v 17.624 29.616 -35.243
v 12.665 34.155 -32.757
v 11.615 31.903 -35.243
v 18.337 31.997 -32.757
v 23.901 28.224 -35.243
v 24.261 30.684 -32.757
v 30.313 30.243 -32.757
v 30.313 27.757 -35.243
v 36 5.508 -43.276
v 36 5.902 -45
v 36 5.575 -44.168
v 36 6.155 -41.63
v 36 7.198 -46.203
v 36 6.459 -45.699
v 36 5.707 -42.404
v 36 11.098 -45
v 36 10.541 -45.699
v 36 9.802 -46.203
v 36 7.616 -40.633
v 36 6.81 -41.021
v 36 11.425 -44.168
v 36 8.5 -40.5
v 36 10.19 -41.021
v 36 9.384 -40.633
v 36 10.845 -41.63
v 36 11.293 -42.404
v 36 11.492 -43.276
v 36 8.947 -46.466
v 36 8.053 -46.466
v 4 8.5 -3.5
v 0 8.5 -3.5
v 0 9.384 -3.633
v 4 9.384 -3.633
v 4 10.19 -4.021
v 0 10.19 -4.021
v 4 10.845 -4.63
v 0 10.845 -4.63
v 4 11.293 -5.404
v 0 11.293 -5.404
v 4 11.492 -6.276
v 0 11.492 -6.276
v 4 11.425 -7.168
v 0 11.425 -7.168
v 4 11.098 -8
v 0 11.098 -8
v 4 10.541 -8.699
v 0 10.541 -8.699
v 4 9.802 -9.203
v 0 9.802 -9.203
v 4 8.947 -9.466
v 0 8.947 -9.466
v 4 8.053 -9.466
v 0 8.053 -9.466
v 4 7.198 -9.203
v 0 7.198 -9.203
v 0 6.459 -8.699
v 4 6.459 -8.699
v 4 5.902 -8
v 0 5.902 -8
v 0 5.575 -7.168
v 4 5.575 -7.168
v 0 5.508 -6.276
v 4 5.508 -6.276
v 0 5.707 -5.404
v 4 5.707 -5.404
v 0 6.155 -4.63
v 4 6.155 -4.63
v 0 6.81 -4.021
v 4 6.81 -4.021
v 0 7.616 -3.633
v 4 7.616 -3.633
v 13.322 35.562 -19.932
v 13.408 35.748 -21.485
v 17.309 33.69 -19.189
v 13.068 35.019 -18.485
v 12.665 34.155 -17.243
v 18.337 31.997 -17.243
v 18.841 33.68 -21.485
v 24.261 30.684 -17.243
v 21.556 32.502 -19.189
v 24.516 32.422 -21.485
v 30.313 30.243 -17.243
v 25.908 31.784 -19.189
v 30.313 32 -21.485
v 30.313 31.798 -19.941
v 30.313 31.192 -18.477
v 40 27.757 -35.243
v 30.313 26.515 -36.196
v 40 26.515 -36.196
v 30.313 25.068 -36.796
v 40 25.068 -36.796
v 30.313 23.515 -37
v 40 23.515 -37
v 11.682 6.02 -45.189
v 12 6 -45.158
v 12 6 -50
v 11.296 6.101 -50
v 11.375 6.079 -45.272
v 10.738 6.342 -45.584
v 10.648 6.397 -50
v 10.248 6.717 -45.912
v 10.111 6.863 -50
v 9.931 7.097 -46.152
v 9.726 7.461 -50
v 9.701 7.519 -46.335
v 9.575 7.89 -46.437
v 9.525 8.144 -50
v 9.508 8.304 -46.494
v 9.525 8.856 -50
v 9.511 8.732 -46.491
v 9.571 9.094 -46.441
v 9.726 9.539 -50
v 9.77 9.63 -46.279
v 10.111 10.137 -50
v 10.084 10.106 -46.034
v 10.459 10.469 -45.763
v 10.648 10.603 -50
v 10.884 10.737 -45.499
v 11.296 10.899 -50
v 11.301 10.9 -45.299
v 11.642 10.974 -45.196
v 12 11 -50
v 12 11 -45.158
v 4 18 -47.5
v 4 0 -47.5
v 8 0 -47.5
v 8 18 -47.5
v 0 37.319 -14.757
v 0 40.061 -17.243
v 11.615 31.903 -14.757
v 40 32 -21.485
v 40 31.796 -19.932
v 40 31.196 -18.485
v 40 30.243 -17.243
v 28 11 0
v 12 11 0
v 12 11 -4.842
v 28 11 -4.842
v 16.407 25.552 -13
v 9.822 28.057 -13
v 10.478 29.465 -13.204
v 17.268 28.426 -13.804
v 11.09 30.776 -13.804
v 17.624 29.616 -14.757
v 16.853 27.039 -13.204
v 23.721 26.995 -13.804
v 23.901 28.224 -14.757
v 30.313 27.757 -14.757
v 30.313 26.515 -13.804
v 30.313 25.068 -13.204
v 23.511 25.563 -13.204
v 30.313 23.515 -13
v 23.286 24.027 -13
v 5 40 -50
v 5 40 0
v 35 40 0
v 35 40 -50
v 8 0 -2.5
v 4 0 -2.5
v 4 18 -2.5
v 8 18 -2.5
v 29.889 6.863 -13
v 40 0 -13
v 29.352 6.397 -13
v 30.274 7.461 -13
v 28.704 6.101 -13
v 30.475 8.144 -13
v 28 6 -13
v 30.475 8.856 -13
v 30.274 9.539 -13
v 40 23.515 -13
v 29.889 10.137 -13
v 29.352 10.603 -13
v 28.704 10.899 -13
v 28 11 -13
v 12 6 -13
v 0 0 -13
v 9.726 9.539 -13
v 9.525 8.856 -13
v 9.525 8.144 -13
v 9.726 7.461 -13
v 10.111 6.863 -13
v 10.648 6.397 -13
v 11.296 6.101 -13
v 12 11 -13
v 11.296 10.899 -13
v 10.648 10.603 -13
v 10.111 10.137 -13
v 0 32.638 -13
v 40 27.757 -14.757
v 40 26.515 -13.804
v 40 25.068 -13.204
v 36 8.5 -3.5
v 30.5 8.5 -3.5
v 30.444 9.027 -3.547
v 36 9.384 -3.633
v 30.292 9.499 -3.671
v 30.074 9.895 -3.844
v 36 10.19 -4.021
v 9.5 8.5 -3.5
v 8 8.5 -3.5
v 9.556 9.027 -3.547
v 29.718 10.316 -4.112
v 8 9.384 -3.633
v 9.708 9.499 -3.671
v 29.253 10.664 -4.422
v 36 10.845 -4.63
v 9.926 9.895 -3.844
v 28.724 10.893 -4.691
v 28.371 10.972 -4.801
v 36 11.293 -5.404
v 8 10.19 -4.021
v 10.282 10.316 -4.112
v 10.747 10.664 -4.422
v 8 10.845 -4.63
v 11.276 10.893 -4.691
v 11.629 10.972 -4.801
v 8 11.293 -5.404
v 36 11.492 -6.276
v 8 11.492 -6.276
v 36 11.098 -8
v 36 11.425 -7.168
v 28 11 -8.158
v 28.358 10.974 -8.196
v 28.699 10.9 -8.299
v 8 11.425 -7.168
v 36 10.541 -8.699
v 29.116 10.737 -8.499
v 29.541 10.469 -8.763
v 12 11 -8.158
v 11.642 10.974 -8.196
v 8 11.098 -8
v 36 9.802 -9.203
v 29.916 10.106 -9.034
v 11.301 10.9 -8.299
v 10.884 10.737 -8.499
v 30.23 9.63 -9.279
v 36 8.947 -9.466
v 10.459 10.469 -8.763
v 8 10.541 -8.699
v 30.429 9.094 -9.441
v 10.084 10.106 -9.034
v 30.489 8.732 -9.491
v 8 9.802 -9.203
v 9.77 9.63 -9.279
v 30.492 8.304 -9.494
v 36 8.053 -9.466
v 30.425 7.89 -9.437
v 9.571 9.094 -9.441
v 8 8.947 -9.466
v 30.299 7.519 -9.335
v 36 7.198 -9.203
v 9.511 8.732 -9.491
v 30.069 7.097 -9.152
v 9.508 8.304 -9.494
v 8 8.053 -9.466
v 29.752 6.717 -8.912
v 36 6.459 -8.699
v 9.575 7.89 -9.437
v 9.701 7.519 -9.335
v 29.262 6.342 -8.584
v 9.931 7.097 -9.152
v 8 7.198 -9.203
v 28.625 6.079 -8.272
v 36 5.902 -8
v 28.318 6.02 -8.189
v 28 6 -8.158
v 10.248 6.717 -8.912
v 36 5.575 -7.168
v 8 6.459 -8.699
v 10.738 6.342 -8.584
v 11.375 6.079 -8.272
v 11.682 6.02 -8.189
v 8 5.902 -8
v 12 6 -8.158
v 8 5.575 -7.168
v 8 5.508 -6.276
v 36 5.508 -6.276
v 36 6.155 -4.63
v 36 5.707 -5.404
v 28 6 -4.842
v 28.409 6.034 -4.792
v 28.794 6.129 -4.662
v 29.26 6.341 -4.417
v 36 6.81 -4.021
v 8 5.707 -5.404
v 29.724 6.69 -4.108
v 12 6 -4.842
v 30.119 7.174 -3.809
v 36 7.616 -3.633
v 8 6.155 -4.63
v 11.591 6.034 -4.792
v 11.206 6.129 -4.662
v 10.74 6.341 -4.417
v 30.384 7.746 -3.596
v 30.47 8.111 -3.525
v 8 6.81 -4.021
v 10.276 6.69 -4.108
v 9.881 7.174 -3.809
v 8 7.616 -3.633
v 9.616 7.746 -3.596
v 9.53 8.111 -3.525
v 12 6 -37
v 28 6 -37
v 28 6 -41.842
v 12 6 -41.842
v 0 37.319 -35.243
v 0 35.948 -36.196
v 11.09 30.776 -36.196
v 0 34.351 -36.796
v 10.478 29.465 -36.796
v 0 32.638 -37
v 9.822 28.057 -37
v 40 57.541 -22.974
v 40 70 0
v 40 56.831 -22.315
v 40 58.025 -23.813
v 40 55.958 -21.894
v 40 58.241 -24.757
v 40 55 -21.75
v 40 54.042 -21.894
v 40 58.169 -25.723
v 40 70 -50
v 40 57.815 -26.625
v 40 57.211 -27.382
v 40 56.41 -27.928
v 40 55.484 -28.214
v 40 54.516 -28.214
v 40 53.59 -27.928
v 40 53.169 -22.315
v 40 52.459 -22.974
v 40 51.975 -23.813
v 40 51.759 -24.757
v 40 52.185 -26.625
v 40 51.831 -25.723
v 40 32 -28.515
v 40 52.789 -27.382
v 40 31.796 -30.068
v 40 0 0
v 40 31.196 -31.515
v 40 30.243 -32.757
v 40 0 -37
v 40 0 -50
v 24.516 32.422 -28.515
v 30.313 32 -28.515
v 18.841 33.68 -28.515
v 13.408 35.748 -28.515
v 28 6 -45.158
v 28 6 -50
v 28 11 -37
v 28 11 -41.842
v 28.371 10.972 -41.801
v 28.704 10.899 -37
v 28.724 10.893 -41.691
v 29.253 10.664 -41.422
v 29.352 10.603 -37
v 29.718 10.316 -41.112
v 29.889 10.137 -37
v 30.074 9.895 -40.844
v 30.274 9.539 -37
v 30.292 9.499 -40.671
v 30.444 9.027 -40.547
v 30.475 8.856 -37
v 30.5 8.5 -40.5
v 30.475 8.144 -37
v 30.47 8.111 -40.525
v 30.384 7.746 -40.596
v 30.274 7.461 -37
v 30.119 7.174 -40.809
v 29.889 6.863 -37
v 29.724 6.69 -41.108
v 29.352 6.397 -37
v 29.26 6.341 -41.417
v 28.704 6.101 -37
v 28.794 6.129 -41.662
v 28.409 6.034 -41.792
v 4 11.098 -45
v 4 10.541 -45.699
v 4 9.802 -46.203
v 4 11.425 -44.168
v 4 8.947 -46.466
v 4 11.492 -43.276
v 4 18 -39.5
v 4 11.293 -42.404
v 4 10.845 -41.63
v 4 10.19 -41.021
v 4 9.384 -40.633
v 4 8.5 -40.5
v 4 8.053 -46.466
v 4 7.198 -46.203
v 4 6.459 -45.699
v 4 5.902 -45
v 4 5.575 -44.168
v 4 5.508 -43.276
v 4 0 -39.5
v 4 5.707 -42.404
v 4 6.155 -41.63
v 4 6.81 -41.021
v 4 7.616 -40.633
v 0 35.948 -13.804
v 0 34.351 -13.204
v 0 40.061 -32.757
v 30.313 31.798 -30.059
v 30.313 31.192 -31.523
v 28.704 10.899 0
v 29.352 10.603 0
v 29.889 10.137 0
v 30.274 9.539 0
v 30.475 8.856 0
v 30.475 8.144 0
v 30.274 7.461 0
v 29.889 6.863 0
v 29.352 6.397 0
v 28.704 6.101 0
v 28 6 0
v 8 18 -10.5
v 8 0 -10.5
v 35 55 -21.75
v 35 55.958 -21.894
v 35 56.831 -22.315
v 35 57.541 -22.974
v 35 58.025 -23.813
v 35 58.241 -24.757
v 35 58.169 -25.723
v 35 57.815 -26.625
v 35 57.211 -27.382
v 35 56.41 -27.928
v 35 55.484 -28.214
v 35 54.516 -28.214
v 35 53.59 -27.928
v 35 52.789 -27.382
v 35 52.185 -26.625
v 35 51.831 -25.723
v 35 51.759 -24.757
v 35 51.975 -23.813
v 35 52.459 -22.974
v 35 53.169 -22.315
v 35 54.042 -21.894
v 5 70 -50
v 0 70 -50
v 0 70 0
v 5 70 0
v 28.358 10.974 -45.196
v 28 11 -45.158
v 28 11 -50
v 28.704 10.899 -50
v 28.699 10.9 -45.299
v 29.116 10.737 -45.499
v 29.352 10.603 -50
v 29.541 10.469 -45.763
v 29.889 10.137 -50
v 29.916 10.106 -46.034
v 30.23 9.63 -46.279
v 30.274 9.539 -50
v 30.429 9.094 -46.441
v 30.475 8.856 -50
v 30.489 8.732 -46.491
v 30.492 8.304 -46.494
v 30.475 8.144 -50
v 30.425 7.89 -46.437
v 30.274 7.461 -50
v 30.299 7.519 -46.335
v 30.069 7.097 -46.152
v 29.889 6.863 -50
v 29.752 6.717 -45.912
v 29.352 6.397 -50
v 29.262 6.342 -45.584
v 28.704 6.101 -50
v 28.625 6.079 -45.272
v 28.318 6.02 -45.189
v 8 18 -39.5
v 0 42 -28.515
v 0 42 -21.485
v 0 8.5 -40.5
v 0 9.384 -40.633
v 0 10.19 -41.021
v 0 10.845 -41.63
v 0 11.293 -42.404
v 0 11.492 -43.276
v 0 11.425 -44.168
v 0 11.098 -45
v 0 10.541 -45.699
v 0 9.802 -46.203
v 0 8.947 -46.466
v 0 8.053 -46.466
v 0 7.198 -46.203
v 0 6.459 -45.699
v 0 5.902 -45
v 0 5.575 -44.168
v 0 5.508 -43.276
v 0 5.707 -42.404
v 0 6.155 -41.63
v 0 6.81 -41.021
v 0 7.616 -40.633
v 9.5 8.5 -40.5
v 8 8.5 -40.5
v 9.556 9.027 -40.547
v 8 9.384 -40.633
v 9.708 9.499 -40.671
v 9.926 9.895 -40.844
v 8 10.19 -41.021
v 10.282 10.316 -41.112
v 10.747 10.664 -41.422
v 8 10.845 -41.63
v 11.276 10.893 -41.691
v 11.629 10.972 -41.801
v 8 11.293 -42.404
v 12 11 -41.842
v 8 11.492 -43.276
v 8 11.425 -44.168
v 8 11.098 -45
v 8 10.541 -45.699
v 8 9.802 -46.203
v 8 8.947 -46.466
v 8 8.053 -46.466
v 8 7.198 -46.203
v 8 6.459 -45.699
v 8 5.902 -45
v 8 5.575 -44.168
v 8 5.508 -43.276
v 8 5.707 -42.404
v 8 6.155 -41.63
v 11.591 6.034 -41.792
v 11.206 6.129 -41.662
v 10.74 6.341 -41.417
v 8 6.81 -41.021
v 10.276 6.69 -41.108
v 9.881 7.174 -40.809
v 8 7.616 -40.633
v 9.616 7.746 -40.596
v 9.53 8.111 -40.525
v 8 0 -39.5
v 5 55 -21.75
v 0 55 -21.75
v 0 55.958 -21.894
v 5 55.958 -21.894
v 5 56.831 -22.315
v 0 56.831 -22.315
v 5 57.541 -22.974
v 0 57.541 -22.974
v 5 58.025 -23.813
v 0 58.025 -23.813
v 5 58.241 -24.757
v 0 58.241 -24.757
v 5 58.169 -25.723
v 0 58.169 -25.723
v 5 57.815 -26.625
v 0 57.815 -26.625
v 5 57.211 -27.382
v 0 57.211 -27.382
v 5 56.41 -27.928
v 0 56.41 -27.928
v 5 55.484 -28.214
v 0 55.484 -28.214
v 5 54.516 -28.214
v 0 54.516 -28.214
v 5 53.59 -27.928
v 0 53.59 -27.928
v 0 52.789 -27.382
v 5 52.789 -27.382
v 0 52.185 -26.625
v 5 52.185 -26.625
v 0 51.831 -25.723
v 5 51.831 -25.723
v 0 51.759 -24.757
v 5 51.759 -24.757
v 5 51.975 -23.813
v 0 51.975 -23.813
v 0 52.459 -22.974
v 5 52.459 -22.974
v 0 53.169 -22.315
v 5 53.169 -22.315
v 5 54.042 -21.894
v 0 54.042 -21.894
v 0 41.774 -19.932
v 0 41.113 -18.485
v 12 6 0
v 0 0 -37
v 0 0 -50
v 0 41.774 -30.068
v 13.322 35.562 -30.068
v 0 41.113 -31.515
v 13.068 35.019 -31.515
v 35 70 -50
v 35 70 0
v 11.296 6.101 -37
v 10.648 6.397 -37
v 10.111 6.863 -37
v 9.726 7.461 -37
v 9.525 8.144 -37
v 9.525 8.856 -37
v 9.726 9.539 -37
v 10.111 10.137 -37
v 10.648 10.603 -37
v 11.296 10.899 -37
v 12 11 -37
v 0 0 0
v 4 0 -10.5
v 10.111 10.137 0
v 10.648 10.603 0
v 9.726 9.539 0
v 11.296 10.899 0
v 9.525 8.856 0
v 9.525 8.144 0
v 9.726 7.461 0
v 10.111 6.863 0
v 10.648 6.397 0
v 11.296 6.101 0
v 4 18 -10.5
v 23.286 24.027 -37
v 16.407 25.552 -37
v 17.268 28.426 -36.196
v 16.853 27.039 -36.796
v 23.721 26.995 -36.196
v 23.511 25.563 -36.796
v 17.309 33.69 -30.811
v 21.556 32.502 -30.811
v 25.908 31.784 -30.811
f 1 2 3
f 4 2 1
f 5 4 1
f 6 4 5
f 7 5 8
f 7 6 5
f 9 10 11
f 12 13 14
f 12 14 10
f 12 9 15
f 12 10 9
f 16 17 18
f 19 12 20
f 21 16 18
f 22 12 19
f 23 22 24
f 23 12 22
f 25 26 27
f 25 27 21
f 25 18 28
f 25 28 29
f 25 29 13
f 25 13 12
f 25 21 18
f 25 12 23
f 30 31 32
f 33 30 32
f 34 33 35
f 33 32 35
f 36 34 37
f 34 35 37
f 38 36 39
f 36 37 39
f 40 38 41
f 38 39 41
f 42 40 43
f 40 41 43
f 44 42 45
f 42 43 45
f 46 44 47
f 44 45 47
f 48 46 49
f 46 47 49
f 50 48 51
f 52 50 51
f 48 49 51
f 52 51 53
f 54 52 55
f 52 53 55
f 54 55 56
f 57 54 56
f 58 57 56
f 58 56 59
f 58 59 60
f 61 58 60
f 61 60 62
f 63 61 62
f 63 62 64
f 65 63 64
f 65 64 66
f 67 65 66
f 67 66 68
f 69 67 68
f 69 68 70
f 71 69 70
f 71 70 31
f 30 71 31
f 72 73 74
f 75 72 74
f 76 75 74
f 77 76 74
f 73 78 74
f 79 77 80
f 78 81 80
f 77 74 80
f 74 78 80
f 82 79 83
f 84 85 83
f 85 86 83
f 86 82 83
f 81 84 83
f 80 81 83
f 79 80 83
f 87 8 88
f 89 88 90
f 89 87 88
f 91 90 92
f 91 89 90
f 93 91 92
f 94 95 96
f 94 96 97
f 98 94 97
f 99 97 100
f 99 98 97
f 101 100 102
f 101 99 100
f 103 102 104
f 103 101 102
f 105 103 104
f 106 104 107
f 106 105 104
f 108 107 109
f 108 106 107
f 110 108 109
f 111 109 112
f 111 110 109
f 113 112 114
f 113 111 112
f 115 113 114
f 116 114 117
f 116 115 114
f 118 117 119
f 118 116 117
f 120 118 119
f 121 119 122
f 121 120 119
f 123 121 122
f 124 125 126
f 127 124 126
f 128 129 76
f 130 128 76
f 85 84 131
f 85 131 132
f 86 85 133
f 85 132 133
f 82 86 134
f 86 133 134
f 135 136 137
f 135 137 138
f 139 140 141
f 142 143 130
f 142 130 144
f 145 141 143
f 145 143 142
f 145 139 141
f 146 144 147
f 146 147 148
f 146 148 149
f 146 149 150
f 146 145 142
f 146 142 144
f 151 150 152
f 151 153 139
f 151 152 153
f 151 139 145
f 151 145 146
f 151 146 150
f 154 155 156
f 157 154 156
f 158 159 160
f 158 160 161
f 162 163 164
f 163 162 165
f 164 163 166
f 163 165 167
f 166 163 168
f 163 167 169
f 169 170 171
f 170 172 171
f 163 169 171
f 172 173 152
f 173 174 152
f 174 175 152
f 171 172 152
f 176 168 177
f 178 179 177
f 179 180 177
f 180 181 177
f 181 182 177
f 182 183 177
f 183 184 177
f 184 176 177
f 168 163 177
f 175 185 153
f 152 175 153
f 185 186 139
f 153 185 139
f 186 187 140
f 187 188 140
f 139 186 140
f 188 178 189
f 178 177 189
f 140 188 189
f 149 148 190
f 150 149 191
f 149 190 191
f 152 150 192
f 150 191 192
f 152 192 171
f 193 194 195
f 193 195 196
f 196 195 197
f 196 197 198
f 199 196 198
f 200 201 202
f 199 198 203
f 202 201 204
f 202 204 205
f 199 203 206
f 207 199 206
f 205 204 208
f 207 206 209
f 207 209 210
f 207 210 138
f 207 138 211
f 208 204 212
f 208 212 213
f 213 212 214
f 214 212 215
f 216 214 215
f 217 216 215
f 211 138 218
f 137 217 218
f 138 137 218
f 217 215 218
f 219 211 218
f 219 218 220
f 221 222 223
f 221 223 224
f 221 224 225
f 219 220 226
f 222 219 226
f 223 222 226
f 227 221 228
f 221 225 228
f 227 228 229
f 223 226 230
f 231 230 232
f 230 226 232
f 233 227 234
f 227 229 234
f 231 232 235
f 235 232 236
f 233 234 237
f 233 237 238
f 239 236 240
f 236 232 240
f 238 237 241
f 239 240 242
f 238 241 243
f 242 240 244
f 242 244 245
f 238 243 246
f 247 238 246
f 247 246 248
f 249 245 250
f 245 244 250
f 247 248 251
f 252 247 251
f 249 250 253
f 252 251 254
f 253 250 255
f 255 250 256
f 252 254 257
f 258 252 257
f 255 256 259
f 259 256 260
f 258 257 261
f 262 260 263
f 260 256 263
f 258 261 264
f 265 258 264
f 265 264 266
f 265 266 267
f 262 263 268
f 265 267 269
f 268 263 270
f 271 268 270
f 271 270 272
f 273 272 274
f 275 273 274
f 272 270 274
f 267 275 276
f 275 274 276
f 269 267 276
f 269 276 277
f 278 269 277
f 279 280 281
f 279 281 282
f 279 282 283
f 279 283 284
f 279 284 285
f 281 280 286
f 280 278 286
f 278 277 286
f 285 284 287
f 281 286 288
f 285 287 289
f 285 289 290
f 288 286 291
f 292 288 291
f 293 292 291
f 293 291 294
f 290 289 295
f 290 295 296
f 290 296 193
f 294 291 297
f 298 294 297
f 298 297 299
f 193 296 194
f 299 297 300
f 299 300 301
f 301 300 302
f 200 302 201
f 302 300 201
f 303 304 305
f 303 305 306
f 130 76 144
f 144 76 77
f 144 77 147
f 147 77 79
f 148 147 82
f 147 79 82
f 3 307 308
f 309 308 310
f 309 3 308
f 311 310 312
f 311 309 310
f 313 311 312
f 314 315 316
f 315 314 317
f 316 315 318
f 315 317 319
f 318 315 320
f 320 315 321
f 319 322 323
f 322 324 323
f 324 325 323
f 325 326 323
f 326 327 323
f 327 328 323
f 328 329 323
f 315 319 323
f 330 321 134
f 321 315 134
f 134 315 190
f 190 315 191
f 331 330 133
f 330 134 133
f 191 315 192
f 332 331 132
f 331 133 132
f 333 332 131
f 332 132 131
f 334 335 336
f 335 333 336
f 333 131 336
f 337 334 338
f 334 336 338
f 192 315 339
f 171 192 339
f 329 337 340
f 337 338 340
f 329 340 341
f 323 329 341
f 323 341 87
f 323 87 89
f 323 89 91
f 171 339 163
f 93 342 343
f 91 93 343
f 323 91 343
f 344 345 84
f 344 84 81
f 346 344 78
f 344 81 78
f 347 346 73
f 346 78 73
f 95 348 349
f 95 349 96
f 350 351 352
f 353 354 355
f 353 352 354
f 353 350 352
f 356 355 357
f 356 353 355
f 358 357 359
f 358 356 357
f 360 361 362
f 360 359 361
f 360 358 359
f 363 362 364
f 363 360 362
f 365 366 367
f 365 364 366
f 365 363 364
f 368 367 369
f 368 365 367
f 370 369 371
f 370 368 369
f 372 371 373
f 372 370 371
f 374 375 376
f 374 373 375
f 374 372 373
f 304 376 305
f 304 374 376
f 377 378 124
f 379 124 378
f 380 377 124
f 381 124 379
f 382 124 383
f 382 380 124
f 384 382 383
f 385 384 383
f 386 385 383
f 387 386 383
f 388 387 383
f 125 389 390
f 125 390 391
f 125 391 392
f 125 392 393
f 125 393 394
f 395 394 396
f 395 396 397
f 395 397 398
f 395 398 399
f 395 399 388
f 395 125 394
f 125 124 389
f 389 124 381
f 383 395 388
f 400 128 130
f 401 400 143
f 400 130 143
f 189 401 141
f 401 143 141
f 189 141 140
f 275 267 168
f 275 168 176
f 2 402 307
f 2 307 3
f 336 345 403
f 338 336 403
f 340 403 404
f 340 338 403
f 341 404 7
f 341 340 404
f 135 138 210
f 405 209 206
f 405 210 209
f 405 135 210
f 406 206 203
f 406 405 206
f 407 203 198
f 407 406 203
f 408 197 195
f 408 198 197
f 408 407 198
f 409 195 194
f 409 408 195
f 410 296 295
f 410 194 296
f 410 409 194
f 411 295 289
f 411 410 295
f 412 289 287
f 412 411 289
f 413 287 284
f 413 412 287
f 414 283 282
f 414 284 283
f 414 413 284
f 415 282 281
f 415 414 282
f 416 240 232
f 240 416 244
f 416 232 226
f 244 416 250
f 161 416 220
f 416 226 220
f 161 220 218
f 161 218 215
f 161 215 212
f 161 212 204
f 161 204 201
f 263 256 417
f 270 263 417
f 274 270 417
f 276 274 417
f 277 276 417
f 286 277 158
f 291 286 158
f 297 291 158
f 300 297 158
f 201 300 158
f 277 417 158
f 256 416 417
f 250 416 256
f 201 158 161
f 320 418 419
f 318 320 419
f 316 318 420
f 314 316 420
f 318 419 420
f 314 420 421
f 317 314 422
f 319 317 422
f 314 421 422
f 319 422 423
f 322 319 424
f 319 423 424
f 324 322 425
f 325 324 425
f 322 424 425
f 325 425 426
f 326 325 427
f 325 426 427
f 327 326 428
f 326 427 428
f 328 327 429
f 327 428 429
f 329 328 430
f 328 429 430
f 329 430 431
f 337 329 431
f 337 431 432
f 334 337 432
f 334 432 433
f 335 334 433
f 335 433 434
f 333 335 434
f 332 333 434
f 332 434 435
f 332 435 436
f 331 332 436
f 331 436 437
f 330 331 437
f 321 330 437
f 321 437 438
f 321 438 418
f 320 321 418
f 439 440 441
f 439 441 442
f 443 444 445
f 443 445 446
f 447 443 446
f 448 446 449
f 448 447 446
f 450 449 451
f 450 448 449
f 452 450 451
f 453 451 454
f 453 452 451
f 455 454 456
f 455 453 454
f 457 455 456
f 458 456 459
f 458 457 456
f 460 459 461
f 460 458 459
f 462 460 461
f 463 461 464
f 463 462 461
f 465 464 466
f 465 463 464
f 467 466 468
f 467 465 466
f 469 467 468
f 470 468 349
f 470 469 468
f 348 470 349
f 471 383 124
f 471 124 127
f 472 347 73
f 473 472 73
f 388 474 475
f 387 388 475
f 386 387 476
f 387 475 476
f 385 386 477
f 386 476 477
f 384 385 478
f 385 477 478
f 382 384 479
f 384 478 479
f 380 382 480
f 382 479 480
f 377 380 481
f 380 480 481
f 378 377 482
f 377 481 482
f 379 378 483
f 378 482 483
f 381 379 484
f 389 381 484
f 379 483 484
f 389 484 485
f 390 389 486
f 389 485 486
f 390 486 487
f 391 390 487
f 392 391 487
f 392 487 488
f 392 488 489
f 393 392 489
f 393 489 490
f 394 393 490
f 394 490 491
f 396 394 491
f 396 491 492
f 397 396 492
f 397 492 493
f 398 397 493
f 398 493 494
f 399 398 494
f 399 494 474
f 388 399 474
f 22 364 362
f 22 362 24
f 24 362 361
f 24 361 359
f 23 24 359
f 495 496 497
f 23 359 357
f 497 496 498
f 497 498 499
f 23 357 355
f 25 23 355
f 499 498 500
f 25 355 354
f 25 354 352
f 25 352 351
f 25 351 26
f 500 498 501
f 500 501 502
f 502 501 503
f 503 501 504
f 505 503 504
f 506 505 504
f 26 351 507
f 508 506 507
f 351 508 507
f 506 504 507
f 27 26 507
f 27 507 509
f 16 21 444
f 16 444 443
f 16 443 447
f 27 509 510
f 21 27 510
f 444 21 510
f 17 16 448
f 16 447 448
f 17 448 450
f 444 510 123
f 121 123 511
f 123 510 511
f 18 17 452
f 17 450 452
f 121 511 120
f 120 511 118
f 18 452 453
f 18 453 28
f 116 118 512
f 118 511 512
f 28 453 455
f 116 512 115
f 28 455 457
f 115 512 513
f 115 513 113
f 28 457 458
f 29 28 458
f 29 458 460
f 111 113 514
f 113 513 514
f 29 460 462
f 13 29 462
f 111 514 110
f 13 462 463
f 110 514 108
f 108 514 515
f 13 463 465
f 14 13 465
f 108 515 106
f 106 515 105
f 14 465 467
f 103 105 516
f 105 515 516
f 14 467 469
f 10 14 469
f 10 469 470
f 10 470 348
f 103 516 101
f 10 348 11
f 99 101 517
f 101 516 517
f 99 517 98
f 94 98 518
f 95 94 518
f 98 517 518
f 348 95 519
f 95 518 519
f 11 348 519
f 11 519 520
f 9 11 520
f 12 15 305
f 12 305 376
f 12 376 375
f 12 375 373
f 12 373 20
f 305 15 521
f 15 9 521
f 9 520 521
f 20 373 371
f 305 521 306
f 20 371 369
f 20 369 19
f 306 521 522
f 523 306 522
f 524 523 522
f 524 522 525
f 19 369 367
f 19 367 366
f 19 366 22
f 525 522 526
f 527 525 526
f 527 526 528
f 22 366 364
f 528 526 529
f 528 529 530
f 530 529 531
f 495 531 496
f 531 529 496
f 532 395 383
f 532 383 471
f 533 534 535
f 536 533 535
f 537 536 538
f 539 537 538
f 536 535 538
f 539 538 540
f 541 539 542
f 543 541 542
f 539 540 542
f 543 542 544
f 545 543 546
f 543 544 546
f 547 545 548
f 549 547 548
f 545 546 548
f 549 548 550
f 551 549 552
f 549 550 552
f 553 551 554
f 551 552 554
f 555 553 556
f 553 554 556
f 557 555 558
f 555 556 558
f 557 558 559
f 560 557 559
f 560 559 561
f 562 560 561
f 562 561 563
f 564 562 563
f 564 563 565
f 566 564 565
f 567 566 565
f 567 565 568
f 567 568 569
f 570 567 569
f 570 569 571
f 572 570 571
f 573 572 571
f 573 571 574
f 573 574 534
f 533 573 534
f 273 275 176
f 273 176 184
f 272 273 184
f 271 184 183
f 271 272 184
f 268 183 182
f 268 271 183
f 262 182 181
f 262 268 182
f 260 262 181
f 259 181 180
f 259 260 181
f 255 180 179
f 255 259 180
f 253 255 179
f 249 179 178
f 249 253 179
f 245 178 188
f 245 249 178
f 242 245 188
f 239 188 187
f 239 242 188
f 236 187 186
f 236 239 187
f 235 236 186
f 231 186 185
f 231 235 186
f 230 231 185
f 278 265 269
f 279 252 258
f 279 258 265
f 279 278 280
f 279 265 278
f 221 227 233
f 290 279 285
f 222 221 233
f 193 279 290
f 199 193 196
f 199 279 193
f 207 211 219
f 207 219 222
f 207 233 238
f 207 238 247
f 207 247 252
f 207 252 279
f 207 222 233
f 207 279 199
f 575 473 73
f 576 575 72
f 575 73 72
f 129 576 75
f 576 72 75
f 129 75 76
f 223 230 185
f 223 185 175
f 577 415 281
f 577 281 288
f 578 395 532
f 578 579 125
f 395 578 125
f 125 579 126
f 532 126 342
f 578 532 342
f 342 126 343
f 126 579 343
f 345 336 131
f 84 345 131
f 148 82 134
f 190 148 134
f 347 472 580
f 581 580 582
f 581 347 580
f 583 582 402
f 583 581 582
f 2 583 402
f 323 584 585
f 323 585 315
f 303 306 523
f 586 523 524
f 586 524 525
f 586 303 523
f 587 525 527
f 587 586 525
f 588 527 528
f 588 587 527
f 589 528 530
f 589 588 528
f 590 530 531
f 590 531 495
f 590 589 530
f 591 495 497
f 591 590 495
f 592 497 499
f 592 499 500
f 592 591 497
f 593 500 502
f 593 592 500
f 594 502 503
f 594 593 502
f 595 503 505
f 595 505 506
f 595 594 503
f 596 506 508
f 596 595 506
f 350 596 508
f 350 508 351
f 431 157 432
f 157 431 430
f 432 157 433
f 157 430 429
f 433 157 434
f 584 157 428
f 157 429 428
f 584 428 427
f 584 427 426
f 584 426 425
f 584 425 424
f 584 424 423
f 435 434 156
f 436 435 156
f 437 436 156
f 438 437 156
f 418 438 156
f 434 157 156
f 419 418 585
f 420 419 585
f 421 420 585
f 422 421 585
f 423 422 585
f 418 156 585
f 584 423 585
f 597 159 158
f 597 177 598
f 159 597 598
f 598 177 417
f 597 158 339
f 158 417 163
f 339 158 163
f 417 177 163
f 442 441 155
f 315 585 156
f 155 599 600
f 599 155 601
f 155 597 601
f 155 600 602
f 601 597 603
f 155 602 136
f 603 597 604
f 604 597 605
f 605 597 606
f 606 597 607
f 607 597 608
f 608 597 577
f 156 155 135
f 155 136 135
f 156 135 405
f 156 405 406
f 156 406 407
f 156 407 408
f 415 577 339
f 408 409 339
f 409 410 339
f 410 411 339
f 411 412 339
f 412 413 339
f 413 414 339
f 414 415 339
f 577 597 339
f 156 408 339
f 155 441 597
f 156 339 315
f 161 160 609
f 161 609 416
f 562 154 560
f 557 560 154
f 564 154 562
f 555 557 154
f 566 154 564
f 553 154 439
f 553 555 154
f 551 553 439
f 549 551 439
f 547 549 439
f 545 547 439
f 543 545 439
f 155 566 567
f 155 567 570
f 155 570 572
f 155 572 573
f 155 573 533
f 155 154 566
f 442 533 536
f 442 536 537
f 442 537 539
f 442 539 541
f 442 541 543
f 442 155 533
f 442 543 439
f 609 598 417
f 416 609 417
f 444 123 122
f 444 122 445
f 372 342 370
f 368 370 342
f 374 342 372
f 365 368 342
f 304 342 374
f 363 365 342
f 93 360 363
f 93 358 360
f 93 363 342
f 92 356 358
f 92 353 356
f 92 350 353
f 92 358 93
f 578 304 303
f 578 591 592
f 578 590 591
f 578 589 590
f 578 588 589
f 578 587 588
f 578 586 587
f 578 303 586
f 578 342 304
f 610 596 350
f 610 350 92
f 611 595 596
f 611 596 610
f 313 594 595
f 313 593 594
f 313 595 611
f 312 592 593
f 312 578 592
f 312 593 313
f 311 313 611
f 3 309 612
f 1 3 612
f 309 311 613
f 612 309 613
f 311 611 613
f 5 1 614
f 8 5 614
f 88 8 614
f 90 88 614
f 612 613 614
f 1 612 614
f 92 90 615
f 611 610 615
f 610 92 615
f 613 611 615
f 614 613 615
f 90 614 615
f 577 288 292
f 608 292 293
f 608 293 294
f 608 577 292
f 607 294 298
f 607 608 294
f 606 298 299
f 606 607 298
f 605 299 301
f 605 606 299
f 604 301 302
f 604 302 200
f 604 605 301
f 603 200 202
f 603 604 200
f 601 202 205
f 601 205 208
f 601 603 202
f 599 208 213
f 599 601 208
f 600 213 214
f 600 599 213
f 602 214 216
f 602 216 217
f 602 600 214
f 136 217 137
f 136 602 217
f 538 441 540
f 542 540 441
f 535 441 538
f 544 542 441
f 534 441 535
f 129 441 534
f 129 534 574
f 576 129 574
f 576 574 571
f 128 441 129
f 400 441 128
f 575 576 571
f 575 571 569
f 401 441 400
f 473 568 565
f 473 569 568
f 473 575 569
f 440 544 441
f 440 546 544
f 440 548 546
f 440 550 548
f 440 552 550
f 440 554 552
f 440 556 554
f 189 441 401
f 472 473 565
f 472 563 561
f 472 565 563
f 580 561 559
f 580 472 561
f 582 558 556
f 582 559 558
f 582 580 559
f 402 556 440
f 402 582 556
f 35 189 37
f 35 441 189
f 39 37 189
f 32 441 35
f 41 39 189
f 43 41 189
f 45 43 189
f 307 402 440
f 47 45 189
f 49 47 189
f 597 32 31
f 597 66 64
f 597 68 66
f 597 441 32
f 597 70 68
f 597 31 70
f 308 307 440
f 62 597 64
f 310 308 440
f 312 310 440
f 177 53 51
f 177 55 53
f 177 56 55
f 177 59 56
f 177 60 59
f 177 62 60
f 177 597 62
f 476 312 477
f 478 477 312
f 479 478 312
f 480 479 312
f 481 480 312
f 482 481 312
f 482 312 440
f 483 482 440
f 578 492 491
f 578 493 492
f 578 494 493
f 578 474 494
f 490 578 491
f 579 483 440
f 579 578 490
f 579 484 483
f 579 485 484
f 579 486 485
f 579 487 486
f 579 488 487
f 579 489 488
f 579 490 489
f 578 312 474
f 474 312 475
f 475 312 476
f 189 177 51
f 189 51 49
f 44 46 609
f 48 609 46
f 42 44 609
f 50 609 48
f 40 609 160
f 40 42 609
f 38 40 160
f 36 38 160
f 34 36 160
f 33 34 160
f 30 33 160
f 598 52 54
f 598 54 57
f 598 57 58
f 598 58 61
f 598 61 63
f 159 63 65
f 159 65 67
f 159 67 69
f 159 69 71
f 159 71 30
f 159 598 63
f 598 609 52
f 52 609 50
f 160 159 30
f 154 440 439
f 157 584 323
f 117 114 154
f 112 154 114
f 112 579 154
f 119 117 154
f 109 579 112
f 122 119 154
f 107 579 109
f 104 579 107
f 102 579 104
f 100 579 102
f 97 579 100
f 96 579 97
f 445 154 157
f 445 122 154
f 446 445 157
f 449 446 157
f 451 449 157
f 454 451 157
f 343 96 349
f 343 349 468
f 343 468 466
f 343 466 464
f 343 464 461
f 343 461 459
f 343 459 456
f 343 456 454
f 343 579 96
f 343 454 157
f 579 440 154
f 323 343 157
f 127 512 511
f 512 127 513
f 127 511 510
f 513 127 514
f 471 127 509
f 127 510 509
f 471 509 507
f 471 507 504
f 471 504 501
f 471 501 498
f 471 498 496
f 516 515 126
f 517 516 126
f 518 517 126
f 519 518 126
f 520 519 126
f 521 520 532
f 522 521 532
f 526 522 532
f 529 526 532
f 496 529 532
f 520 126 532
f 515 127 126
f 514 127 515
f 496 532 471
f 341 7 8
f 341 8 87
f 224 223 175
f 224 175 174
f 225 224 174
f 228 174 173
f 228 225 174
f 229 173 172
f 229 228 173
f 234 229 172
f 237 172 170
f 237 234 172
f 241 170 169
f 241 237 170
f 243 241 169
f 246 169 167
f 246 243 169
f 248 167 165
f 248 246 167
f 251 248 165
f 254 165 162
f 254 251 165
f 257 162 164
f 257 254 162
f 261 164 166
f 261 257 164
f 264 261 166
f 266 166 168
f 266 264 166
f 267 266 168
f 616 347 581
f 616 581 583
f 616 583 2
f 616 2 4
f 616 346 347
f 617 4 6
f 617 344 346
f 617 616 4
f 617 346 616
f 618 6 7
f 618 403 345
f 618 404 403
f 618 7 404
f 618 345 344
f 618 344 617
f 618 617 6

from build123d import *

# Parameters (mm, degrees)
SKETCH1_W           = 40
SKETCH1_H           = 50
BOSS_EXTRUDE1_DEPTH = 70
SKETCH2_W           = 30
SKETCH2_H           = 30
CUT_EXTRUDE1_DEPTH  = 51
SKETCH3_W           = 24
SKETCH3_H           = 32
CUT_EXTRUDE2_DEPTH  = 41
SKETCH8_R           = 3.25
CUT_EXTRUDE6_DEPTH  = 41
SKETCH5_R           = 3
CUT_EXTRUDE7_DEPTH  = 36
SKETCH9_W           = 4
SKETCH9_H           = 8
CUT_EXTRUDE8_DEPTH  = 18
CUT_EXTRUDE9_DEPTH  = 51
CHAMFER2_SIZE       = 10
CHAMFER2_SIZE2      = 21.445069205
FILLET3_R           = 40
CHAMFER4_SIZE       = 6
FILLET4_R           = 6


with BuildPart() as part:
    # Sketch1 → Boss-Extrude1 (new body)
    with BuildSketch(Plane(origin=(0, 0, 0), x_dir=(1, 0, 0), z_dir=(0, 1, 0))):
        with Locations((20, 25)):
            Rectangle(SKETCH1_W, SKETCH1_H)
    extrude(amount=BOSS_EXTRUDE1_DEPTH)

    # Sketch2 → Cut-Extrude1 (cut, through all)
    with BuildSketch(Plane.XY):
        with Locations((20, 55)):
            Rectangle(SKETCH2_W, SKETCH2_H)
    extrude(amount=-CUT_EXTRUDE1_DEPTH, mode=Mode.SUBTRACT)

    # Sketch3 → Cut-Extrude2 (cut, through all)
    with BuildSketch(Plane.ZY):
        with Locations((-25, 16)):
            Rectangle(SKETCH3_W, SKETCH3_H)
    extrude(amount=-CUT_EXTRUDE2_DEPTH, mode=Mode.SUBTRACT)

    # Sketch8 → Cut-Extrude6 (cut, through all)
    with BuildSketch(Plane.ZY):
        with Locations((-25, 55)):
            Circle(SKETCH8_R)
    extrude(amount=-CUT_EXTRUDE6_DEPTH, mode=Mode.SUBTRACT)

    # Sketch5 → Cut-Extrude7 (cut)
    with BuildSketch(Plane.ZY):
        with Locations((-43.5, 8.5)):
            Circle(SKETCH5_R)
        with Locations((-6.5, 8.5)):
            Circle(SKETCH5_R)
    extrude(amount=-CUT_EXTRUDE7_DEPTH, mode=Mode.SUBTRACT)

    # Sketch9 → Cut-Extrude8 (cut)
    with BuildSketch(Plane.XZ):
        with Locations((6, -43.5)):
            Rectangle(SKETCH9_W, SKETCH9_H)
        with Locations((6, -6.5)):
            Rectangle(SKETCH9_W, SKETCH9_H)
    extrude(amount=-CUT_EXTRUDE8_DEPTH, mode=Mode.SUBTRACT)

    # Sketch10 → Cut-Extrude9 (cut, through all)
    with BuildSketch(Plane.XY):
        with BuildLine():
            Line((28, 6), (12, 6))
            ThreePointArc((12, 6), (9.5, 8.5), (12, 11))
            Line((12, 11), (28, 11))
            ThreePointArc((28, 11), (30.5, 8.5), (28, 6))
        make_face()
    extrude(amount=-CUT_EXTRUDE9_DEPTH, mode=Mode.SUBTRACT)

    # Chamfer2
    chamfer2_edges = [part.edges().sort_by_distance(p)[0] for p in [
        (0, 32, -25),
    ]]
    chamfer2_side = [part.faces().sort_by_distance(p)[0] for p in [
        (0, 40.838498112, -25),
    ]]
    chamfer(chamfer2_edges, length=CHAMFER2_SIZE, length2=CHAMFER2_SIZE2, reference=chamfer2_side[0])

    # Fillet3
    fillet3_edges = [part.edges().sort_by_distance(p)[0] for p in [
        (21.445069205, 32, -25),
    ]]
    fillet(fillet3_edges, radius=FILLET3_R)

    # Chamfer4
    chamfer4_edges = [part.edges().sort_by_distance(p)[0] for p in [
        (6.704062621, 38.873844259, -13),
        (6.704062621, 38.873844259, -37),
        (21.655271153, 32.948159715, -37),
        (21.655271153, 32.948159715, -13),
        (35.156427855, 32, -37),
        (35.156427855, 32, -13),
    ]]
    chamfer(chamfer4_edges, length=CHAMFER4_SIZE)

    # Fillet4
    fillet4_edges = [part.edges().sort_by_distance(p)[0] for p in [
        (35.156427855, 26, -13),
        (20.35663347, 27.090383672, -13),
        (5.436207835, 32.844787141, -13),
        (6.704062621, 38.873844259, -31),
        (6.704062621, 38.873844259, -19),
        (21.655271153, 32.948159715, -31),
        (21.655271153, 32.948159715, -19),
        (35.156427855, 32, -31),
        (35.156427855, 32, -19),
        (35.156427855, 26, -37),
        (20.35663347, 27.090383672, -37),
        (5.436207835, 32.844787141, -37),
    ]]
    fillet(fillet4_edges, radius=FILLET4_R)


solid = part.part
